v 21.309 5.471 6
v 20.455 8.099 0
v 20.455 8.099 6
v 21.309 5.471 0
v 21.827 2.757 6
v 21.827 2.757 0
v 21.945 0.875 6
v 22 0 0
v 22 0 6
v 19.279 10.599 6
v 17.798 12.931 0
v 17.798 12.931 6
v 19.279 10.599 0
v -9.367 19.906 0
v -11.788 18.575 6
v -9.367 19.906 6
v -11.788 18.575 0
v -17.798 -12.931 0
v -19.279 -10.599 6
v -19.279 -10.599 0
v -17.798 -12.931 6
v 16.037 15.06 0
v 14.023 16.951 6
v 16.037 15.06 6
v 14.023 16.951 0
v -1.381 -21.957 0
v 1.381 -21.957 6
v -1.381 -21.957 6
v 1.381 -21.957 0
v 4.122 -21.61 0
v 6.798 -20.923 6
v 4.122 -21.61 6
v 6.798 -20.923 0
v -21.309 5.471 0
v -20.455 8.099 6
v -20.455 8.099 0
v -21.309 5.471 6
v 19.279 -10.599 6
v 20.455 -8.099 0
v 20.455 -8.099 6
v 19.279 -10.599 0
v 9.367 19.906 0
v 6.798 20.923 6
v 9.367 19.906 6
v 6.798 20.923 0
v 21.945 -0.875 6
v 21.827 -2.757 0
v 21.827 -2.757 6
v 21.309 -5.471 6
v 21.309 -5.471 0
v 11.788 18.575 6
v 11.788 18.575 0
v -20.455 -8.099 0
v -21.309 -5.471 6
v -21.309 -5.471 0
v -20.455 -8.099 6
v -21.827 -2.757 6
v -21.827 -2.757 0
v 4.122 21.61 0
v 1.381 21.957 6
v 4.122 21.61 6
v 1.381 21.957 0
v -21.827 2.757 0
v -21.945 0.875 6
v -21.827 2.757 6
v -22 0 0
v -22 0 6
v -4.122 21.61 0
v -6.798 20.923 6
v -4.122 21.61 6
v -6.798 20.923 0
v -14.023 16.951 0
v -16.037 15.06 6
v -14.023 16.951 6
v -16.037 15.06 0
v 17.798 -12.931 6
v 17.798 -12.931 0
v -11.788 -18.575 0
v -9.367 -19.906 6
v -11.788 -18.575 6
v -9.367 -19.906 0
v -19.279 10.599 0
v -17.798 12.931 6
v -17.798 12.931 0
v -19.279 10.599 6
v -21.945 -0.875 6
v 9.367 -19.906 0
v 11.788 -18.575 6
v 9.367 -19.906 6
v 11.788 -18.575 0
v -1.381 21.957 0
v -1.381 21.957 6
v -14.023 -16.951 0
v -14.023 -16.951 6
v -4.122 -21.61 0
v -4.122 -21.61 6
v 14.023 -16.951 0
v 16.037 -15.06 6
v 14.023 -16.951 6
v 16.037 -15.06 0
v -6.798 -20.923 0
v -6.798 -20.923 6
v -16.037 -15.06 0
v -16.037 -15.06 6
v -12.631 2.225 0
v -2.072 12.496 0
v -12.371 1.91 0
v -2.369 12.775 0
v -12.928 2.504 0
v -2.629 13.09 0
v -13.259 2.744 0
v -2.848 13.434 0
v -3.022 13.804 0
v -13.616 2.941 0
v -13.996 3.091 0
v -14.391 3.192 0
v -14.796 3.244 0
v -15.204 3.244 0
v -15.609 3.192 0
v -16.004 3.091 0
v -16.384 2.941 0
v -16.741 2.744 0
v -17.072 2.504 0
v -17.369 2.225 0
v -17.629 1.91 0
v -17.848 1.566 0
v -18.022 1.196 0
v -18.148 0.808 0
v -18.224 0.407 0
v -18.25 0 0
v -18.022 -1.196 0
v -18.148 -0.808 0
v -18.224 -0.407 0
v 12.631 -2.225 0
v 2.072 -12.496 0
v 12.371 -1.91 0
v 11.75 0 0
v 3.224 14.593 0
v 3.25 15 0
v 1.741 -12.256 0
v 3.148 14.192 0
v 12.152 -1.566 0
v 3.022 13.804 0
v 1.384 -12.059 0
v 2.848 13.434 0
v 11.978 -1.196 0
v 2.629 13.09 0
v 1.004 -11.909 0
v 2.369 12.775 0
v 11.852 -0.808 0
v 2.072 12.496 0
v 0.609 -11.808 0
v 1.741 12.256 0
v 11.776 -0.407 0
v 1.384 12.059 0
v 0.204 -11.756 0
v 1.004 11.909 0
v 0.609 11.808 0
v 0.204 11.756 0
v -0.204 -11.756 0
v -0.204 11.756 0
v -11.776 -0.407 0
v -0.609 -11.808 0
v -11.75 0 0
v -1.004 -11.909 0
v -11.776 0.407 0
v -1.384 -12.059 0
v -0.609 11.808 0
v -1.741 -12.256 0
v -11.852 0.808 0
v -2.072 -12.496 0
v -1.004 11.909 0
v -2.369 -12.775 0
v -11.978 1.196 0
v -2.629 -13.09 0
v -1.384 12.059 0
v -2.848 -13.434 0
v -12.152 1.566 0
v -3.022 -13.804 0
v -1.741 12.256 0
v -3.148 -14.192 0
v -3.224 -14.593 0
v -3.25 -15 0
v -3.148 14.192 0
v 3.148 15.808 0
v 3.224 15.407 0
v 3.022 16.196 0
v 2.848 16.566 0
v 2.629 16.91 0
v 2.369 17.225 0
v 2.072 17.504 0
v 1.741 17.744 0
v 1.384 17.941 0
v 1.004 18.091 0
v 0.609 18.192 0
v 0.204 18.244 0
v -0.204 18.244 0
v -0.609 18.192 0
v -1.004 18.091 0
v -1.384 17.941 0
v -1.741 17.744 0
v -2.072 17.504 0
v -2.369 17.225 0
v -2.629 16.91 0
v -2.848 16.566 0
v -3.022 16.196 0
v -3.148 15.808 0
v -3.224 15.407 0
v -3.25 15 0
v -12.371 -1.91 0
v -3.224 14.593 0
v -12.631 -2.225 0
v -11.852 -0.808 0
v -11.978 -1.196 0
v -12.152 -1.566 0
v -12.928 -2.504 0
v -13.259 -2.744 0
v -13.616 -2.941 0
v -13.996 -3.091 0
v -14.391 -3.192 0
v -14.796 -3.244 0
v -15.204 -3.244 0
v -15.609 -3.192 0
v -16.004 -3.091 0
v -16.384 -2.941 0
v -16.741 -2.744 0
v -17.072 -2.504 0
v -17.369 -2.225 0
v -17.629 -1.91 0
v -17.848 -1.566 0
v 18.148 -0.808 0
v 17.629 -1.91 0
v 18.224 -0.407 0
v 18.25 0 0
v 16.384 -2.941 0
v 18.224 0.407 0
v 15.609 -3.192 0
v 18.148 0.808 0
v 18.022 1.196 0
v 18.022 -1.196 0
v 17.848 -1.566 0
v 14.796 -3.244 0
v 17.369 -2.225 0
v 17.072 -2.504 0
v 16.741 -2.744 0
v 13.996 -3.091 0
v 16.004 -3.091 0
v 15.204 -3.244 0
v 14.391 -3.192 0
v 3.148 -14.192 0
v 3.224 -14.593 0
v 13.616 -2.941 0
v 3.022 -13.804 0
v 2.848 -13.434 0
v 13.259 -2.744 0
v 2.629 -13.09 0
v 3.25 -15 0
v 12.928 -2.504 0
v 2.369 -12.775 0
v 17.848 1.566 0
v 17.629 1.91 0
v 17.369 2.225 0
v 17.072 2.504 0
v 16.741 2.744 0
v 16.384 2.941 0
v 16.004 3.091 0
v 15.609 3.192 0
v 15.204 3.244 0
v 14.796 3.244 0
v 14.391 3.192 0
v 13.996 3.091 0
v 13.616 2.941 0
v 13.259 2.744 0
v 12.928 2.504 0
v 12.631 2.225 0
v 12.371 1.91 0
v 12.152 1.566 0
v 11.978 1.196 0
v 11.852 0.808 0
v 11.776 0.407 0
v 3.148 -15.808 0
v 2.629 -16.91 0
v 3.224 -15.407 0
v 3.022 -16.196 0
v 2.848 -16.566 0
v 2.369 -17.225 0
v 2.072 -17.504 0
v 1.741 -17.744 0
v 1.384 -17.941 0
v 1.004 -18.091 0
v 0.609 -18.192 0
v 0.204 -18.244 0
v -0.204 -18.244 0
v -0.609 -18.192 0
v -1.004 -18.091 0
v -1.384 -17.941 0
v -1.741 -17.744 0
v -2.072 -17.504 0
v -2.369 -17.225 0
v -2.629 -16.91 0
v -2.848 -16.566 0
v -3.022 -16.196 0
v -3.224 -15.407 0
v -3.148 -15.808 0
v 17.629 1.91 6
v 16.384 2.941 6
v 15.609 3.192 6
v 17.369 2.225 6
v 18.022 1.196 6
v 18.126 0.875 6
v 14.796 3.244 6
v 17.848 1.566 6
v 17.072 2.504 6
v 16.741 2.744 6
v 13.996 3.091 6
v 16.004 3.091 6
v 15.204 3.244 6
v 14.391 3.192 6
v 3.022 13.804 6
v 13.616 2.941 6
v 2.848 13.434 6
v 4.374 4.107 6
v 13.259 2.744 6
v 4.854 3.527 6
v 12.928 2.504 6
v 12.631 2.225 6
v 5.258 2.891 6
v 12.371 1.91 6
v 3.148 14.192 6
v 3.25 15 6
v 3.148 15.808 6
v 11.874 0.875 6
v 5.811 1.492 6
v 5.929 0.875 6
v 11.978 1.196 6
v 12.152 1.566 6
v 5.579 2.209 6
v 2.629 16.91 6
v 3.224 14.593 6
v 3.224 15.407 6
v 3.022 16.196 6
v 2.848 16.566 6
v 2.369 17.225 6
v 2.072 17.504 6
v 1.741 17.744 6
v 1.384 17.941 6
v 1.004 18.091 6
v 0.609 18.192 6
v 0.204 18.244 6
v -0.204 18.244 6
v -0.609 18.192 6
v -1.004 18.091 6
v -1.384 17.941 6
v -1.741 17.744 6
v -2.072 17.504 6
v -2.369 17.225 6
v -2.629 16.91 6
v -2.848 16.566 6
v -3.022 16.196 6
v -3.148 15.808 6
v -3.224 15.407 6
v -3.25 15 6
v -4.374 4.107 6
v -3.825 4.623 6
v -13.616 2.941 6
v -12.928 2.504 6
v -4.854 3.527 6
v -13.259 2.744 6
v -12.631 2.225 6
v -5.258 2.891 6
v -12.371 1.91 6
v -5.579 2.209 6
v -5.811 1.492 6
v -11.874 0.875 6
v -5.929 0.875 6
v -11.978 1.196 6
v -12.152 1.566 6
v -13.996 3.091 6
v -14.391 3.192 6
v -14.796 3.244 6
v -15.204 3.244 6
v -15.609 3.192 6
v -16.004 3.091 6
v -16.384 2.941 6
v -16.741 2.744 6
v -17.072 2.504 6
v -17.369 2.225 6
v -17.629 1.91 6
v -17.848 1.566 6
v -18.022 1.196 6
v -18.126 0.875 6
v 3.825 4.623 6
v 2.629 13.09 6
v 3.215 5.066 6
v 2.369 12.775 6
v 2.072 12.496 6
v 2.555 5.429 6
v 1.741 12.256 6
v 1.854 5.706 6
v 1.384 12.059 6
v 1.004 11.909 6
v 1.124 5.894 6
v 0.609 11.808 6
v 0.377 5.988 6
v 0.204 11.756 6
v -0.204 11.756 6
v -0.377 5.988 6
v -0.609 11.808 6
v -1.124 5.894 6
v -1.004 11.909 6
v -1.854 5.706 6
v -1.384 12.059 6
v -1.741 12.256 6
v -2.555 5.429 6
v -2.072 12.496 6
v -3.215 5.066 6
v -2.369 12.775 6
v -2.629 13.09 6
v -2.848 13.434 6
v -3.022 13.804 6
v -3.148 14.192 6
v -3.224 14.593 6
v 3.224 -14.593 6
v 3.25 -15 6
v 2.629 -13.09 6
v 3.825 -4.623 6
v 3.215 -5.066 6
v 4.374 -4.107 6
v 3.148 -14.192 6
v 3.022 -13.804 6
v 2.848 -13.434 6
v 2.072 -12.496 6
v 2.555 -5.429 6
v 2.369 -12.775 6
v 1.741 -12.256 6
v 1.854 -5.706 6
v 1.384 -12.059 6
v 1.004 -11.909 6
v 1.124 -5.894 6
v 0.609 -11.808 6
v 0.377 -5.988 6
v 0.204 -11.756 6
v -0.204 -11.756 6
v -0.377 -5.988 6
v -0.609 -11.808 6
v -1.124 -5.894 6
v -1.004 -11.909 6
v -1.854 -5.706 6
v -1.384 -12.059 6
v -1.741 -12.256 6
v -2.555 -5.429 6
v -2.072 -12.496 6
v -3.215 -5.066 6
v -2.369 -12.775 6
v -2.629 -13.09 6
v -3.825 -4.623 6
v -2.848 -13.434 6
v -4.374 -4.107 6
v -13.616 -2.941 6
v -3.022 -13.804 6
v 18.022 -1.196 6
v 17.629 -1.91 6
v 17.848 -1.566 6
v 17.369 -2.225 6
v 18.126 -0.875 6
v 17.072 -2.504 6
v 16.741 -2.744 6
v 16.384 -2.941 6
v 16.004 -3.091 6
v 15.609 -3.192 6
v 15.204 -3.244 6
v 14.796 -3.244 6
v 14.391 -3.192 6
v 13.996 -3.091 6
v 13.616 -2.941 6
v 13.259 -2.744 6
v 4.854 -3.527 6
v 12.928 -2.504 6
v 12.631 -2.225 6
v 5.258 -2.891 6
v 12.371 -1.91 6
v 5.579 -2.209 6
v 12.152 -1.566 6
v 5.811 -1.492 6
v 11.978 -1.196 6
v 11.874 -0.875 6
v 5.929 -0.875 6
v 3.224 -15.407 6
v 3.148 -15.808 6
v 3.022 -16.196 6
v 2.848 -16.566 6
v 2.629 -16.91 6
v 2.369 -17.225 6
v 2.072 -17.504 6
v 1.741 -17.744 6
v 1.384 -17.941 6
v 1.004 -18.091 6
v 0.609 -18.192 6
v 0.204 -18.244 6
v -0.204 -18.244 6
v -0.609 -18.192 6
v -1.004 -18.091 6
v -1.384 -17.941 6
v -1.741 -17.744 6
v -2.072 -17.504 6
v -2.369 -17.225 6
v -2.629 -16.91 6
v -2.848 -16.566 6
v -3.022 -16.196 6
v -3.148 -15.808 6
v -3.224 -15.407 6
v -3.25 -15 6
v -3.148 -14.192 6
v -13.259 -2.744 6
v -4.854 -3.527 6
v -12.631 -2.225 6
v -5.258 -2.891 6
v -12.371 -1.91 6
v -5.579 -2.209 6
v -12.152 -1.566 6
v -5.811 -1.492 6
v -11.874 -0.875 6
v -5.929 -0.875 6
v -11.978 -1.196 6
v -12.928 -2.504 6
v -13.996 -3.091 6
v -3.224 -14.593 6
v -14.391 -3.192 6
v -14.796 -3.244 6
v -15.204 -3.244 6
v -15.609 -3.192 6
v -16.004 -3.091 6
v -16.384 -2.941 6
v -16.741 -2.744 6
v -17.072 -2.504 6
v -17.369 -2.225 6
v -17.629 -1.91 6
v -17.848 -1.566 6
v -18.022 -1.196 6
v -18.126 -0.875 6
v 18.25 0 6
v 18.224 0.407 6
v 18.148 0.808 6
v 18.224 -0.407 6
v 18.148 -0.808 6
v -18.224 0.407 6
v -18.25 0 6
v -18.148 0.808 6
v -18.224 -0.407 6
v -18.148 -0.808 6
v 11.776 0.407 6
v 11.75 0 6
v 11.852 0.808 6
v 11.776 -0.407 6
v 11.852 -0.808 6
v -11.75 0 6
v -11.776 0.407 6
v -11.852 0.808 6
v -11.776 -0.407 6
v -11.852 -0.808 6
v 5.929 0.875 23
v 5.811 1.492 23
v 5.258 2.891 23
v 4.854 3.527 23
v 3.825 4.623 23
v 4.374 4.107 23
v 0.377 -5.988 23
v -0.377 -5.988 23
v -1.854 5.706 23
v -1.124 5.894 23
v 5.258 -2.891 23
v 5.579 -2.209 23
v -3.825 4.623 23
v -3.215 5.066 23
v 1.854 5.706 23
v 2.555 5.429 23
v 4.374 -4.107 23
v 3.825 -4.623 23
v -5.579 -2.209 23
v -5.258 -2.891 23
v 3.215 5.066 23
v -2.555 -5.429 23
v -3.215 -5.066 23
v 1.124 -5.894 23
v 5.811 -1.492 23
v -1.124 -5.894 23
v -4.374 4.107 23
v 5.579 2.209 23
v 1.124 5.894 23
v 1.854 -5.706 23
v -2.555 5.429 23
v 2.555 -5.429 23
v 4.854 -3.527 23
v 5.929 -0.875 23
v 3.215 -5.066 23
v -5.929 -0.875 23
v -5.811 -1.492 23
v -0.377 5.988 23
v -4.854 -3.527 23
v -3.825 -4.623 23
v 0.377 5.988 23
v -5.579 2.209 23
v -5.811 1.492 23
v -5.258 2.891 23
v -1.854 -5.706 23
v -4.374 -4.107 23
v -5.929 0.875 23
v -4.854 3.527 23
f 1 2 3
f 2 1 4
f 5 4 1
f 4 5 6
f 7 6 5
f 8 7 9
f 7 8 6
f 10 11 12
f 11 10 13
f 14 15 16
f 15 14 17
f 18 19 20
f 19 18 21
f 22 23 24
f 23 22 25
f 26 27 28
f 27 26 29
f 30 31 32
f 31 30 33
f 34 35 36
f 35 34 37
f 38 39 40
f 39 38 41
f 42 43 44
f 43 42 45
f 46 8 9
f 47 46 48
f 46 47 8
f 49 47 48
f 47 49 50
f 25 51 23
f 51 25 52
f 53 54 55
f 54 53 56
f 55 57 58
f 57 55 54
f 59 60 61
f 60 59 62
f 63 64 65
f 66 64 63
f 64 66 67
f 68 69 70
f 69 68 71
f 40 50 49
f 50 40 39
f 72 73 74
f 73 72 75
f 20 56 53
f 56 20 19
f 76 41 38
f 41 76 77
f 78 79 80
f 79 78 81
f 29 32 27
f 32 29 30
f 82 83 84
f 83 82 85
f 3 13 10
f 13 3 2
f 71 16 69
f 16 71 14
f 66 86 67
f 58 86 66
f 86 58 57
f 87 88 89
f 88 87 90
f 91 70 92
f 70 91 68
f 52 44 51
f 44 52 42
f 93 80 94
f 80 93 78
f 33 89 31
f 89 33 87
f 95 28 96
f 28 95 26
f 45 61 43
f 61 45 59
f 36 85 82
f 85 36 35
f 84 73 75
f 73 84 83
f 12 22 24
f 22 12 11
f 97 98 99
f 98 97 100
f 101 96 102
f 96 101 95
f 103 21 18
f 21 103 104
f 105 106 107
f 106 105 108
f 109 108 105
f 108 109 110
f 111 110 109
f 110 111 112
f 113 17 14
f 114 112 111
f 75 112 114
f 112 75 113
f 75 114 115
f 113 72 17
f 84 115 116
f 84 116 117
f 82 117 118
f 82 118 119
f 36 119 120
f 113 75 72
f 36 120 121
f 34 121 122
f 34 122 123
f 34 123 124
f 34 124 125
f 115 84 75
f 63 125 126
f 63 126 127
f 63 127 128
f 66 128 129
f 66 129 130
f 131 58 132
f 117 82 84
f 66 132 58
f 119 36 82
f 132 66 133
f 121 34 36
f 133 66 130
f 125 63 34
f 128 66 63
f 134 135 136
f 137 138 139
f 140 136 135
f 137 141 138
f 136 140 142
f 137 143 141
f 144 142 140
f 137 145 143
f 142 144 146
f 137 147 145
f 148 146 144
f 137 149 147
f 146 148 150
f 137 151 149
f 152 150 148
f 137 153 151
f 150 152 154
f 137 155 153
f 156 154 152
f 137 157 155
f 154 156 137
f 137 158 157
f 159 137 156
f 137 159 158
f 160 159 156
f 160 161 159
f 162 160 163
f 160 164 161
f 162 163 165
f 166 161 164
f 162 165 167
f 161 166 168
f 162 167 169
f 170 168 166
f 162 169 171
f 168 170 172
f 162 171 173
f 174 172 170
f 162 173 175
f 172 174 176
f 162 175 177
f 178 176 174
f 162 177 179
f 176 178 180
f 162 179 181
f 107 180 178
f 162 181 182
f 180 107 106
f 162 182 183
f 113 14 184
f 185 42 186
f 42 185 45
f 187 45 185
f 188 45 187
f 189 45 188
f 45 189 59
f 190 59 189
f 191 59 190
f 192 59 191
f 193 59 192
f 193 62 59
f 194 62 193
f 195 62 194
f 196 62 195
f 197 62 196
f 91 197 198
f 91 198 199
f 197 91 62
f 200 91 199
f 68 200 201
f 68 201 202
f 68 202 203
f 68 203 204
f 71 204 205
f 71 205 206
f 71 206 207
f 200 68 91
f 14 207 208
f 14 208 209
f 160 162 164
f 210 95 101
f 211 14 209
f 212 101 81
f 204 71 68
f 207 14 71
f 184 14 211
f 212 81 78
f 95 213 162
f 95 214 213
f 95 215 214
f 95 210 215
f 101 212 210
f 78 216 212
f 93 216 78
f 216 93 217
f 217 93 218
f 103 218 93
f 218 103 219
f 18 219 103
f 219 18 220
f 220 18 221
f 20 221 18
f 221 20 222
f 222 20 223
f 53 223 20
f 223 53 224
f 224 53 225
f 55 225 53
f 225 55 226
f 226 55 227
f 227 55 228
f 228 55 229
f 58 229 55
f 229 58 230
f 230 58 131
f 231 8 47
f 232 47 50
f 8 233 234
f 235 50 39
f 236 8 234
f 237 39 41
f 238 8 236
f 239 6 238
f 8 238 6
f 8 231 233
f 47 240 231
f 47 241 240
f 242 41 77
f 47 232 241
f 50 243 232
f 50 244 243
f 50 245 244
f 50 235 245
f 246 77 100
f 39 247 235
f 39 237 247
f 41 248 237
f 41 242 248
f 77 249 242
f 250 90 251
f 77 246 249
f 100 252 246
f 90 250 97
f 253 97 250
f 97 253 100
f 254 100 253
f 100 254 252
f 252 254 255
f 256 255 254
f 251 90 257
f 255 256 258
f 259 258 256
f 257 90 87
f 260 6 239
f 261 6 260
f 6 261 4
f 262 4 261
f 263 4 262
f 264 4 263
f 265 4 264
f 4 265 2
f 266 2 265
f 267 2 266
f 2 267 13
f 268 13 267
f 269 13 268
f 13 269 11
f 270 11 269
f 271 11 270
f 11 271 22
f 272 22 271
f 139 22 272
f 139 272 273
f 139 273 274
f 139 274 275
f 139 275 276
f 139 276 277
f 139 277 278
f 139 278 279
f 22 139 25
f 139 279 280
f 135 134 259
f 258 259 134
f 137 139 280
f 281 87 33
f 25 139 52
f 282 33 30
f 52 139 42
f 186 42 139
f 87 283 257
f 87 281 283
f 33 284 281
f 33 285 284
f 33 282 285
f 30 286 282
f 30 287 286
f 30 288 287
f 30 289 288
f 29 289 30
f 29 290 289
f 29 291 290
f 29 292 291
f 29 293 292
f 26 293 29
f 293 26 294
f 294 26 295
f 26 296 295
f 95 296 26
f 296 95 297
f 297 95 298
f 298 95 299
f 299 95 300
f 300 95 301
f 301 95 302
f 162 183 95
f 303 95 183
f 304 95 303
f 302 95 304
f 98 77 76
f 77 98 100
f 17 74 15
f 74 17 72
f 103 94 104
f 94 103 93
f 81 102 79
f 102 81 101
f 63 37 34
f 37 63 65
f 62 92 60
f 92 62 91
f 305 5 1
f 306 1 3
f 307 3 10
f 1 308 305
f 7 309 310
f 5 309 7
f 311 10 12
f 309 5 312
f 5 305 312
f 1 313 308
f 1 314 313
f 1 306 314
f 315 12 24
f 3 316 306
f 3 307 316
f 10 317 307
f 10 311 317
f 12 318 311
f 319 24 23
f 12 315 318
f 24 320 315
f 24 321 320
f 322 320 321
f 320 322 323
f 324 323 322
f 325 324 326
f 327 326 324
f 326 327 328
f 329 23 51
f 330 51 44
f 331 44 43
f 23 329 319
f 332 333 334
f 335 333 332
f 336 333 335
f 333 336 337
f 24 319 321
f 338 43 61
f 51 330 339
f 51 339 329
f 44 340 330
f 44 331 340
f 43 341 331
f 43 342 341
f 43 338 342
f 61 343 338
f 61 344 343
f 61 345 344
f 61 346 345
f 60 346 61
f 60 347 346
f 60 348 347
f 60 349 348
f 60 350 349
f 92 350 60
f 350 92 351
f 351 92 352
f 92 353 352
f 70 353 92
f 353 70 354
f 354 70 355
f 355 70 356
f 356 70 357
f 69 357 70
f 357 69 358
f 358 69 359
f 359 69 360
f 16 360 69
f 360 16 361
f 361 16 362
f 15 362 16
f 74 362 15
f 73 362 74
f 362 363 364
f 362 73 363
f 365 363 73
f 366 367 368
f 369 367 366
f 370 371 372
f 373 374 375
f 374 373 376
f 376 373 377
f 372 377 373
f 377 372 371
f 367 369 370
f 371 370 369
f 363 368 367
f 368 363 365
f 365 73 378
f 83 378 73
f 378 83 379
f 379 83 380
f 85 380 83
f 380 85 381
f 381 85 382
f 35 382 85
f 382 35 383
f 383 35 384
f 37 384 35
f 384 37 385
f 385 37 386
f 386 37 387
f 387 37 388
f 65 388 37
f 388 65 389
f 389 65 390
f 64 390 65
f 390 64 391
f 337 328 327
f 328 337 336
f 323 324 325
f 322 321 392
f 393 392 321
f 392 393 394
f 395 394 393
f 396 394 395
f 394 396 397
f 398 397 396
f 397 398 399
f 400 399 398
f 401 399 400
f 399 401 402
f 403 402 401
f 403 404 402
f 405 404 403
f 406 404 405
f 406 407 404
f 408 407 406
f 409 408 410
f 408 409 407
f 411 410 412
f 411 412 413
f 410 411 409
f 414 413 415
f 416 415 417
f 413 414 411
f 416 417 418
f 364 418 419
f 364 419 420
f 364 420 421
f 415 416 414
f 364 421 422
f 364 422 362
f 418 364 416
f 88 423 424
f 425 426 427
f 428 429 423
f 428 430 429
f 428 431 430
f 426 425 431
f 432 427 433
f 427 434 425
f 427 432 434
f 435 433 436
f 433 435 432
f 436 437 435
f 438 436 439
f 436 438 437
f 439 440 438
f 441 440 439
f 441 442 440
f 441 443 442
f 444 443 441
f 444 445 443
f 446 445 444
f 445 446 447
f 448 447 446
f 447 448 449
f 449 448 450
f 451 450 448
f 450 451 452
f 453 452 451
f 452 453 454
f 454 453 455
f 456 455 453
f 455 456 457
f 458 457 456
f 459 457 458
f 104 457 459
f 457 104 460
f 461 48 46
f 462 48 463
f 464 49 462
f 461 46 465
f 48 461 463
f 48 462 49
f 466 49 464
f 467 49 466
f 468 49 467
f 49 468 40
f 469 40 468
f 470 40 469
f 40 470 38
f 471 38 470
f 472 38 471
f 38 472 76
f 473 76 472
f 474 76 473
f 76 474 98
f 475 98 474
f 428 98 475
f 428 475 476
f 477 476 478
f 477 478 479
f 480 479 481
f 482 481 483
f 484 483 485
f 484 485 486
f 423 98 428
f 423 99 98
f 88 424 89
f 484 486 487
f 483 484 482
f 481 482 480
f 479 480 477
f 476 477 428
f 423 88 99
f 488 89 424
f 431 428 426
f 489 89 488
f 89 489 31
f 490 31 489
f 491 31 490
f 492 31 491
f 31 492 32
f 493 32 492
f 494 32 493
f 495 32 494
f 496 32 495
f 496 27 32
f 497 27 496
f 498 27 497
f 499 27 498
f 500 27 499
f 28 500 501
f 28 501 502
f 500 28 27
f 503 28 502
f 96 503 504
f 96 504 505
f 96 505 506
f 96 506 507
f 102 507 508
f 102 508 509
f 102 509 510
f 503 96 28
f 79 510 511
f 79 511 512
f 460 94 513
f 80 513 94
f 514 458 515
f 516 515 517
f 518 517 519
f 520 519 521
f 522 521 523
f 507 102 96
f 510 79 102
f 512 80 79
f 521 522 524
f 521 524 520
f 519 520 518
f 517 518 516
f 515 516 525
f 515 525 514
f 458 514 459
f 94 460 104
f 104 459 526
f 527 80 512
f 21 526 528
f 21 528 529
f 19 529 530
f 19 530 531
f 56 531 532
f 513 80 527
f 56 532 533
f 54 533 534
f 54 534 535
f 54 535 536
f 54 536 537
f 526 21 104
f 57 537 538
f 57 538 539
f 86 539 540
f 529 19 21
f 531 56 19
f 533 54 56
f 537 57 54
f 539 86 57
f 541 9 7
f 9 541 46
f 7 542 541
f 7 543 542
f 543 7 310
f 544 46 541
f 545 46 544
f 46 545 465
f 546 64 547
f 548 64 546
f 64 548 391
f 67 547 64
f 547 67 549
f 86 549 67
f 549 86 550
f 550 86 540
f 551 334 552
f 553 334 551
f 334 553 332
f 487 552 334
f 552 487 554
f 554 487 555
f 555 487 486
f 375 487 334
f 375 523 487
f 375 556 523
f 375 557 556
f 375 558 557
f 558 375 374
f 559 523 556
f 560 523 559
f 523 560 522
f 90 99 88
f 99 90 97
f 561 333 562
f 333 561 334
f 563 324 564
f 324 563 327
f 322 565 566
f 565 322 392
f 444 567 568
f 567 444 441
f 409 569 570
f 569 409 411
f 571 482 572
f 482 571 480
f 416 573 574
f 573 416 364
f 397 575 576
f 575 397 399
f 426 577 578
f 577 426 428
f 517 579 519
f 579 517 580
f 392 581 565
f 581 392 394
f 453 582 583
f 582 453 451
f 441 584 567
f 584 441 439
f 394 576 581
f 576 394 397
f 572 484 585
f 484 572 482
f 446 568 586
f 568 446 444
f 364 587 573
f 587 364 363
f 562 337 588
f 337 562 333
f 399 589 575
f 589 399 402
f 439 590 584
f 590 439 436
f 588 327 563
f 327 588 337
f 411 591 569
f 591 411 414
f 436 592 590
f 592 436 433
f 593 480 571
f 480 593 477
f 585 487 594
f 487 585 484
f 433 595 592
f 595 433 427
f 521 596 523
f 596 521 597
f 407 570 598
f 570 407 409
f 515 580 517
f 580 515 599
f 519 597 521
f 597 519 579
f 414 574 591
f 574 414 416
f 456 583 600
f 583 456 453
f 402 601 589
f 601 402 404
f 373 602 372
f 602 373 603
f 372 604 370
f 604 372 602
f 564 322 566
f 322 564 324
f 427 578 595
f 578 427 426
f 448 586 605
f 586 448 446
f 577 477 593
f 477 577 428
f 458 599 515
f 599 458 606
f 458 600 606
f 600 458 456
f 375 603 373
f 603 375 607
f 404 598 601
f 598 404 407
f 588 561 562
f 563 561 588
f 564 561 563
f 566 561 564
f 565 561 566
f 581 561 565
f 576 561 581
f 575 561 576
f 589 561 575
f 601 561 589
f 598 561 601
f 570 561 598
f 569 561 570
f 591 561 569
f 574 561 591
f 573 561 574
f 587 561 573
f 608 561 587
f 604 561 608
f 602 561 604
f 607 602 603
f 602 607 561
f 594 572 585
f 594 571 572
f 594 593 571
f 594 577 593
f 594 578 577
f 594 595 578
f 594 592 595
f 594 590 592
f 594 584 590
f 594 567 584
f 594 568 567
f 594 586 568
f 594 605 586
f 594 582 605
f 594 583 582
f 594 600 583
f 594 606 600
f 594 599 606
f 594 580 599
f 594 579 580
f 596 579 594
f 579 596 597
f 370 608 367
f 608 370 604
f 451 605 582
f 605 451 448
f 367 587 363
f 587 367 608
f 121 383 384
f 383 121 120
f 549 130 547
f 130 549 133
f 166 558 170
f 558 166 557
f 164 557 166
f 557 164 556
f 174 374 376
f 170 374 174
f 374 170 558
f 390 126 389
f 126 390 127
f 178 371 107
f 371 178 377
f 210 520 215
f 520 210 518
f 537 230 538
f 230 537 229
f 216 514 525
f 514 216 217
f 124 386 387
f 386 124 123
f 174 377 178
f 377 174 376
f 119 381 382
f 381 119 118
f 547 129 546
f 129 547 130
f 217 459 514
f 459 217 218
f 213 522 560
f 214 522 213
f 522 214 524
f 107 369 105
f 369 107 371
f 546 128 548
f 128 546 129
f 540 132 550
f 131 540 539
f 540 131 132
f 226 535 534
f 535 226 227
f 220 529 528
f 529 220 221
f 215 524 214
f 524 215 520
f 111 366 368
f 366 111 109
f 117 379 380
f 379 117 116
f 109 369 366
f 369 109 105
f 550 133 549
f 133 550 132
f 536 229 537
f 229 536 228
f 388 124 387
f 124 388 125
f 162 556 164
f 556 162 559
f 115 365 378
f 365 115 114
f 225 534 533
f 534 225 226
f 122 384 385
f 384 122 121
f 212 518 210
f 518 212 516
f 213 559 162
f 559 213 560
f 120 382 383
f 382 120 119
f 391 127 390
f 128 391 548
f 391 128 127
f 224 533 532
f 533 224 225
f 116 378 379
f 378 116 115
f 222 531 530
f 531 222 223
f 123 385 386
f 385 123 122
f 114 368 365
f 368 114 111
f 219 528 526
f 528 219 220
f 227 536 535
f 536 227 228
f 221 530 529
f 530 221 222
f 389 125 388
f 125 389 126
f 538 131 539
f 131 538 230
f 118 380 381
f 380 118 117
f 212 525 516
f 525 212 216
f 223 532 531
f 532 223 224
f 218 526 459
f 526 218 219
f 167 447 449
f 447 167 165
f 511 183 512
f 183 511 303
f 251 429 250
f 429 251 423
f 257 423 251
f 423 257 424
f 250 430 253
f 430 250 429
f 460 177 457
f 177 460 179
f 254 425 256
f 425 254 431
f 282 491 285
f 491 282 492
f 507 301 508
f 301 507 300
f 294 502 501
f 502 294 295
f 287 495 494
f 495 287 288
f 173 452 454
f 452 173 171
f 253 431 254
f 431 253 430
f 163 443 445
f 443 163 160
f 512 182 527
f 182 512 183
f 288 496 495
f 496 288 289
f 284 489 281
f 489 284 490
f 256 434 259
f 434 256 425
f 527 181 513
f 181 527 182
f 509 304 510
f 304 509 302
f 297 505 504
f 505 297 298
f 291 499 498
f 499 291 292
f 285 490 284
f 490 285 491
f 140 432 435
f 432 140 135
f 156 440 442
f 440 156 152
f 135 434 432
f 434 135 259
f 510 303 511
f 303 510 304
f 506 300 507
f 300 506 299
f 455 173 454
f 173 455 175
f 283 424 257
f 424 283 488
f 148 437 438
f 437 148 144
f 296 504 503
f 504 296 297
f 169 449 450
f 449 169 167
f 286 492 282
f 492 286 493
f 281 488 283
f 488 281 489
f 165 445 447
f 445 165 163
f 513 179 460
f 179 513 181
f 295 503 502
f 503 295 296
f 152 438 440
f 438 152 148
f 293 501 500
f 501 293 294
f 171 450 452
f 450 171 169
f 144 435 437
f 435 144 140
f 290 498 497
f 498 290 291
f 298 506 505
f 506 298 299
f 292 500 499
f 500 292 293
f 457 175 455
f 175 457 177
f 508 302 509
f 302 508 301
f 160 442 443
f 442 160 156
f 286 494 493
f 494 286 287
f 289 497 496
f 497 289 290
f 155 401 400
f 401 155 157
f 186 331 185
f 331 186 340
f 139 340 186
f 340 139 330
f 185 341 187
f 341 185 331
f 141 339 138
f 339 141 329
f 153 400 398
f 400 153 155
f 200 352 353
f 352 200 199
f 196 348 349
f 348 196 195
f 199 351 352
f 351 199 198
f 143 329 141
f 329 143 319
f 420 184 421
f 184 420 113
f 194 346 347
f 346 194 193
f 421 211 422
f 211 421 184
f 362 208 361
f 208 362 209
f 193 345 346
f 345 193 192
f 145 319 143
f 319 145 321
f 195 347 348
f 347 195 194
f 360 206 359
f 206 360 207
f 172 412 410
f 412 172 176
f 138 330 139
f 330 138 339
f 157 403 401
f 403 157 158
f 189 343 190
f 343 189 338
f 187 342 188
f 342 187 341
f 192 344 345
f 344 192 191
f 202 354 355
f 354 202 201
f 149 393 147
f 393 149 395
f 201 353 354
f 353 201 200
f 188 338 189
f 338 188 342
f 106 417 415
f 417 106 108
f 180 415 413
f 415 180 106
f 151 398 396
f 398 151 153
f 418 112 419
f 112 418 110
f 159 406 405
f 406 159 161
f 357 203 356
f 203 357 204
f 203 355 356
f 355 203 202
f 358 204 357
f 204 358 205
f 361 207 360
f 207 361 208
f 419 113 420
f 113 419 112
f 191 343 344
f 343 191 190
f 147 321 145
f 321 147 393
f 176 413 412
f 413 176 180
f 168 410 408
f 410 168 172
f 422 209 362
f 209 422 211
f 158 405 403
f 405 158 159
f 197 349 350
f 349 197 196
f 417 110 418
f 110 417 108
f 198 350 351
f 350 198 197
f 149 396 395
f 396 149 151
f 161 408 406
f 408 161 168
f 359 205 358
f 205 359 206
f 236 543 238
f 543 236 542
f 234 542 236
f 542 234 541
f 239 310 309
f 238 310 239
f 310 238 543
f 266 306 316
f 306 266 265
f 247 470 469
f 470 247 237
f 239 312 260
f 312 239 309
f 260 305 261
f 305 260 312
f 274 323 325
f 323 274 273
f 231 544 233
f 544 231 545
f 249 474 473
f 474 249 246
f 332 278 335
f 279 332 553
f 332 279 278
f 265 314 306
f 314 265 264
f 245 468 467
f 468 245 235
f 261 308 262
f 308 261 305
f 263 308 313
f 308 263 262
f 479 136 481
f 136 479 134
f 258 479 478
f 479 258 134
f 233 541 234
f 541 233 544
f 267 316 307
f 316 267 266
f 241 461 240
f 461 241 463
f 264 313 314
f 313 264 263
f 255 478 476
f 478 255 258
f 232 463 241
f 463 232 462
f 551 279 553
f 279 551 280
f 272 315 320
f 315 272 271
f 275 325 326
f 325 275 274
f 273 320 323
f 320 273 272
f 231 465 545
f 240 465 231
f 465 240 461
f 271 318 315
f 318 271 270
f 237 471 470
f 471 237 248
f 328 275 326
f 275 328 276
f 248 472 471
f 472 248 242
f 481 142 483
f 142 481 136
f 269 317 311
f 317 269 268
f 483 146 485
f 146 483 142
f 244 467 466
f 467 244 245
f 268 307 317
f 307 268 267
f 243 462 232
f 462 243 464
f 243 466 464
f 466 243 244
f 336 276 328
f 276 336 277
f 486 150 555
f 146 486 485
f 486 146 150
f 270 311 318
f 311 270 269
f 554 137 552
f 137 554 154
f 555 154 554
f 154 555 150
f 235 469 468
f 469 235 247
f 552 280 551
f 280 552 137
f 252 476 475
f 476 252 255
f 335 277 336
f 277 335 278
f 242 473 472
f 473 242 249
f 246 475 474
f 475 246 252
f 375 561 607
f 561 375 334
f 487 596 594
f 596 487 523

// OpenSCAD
$fn = 50;


difference() {
	union() {
		cylinder(h = 6, r = 22.0000000000);
		translate(v = [0, 0, 3.0000000000]) {
			cylinder(h = 20, r = 6.0000000000);
		}
	}
	union() {
		translate(v = [-15.0000000000, 0.0000000000, 0.0000000000]) {
			cylinder(h = 100, r = 3.2500000000);
		}
		translate(v = [0.0000000000, -15.0000000000, 0.0000000000]) {
			cylinder(h = 100, r = 3.2500000000);
		}
		translate(v = [0.0000000000, 15.0000000000, 0.0000000000]) {
			cylinder(h = 100, r = 3.2500000000);
		}
		translate(v = [15.0000000000, 0.0000000000, 0.0000000000]) {
			cylinder(h = 100, r = 3.2500000000);
		}
		translate(v = [-27.0000000000, -0.8750000000, 6]) {
			cube(size = [54, 1.7500000000, 20]);
		}
	}
}
